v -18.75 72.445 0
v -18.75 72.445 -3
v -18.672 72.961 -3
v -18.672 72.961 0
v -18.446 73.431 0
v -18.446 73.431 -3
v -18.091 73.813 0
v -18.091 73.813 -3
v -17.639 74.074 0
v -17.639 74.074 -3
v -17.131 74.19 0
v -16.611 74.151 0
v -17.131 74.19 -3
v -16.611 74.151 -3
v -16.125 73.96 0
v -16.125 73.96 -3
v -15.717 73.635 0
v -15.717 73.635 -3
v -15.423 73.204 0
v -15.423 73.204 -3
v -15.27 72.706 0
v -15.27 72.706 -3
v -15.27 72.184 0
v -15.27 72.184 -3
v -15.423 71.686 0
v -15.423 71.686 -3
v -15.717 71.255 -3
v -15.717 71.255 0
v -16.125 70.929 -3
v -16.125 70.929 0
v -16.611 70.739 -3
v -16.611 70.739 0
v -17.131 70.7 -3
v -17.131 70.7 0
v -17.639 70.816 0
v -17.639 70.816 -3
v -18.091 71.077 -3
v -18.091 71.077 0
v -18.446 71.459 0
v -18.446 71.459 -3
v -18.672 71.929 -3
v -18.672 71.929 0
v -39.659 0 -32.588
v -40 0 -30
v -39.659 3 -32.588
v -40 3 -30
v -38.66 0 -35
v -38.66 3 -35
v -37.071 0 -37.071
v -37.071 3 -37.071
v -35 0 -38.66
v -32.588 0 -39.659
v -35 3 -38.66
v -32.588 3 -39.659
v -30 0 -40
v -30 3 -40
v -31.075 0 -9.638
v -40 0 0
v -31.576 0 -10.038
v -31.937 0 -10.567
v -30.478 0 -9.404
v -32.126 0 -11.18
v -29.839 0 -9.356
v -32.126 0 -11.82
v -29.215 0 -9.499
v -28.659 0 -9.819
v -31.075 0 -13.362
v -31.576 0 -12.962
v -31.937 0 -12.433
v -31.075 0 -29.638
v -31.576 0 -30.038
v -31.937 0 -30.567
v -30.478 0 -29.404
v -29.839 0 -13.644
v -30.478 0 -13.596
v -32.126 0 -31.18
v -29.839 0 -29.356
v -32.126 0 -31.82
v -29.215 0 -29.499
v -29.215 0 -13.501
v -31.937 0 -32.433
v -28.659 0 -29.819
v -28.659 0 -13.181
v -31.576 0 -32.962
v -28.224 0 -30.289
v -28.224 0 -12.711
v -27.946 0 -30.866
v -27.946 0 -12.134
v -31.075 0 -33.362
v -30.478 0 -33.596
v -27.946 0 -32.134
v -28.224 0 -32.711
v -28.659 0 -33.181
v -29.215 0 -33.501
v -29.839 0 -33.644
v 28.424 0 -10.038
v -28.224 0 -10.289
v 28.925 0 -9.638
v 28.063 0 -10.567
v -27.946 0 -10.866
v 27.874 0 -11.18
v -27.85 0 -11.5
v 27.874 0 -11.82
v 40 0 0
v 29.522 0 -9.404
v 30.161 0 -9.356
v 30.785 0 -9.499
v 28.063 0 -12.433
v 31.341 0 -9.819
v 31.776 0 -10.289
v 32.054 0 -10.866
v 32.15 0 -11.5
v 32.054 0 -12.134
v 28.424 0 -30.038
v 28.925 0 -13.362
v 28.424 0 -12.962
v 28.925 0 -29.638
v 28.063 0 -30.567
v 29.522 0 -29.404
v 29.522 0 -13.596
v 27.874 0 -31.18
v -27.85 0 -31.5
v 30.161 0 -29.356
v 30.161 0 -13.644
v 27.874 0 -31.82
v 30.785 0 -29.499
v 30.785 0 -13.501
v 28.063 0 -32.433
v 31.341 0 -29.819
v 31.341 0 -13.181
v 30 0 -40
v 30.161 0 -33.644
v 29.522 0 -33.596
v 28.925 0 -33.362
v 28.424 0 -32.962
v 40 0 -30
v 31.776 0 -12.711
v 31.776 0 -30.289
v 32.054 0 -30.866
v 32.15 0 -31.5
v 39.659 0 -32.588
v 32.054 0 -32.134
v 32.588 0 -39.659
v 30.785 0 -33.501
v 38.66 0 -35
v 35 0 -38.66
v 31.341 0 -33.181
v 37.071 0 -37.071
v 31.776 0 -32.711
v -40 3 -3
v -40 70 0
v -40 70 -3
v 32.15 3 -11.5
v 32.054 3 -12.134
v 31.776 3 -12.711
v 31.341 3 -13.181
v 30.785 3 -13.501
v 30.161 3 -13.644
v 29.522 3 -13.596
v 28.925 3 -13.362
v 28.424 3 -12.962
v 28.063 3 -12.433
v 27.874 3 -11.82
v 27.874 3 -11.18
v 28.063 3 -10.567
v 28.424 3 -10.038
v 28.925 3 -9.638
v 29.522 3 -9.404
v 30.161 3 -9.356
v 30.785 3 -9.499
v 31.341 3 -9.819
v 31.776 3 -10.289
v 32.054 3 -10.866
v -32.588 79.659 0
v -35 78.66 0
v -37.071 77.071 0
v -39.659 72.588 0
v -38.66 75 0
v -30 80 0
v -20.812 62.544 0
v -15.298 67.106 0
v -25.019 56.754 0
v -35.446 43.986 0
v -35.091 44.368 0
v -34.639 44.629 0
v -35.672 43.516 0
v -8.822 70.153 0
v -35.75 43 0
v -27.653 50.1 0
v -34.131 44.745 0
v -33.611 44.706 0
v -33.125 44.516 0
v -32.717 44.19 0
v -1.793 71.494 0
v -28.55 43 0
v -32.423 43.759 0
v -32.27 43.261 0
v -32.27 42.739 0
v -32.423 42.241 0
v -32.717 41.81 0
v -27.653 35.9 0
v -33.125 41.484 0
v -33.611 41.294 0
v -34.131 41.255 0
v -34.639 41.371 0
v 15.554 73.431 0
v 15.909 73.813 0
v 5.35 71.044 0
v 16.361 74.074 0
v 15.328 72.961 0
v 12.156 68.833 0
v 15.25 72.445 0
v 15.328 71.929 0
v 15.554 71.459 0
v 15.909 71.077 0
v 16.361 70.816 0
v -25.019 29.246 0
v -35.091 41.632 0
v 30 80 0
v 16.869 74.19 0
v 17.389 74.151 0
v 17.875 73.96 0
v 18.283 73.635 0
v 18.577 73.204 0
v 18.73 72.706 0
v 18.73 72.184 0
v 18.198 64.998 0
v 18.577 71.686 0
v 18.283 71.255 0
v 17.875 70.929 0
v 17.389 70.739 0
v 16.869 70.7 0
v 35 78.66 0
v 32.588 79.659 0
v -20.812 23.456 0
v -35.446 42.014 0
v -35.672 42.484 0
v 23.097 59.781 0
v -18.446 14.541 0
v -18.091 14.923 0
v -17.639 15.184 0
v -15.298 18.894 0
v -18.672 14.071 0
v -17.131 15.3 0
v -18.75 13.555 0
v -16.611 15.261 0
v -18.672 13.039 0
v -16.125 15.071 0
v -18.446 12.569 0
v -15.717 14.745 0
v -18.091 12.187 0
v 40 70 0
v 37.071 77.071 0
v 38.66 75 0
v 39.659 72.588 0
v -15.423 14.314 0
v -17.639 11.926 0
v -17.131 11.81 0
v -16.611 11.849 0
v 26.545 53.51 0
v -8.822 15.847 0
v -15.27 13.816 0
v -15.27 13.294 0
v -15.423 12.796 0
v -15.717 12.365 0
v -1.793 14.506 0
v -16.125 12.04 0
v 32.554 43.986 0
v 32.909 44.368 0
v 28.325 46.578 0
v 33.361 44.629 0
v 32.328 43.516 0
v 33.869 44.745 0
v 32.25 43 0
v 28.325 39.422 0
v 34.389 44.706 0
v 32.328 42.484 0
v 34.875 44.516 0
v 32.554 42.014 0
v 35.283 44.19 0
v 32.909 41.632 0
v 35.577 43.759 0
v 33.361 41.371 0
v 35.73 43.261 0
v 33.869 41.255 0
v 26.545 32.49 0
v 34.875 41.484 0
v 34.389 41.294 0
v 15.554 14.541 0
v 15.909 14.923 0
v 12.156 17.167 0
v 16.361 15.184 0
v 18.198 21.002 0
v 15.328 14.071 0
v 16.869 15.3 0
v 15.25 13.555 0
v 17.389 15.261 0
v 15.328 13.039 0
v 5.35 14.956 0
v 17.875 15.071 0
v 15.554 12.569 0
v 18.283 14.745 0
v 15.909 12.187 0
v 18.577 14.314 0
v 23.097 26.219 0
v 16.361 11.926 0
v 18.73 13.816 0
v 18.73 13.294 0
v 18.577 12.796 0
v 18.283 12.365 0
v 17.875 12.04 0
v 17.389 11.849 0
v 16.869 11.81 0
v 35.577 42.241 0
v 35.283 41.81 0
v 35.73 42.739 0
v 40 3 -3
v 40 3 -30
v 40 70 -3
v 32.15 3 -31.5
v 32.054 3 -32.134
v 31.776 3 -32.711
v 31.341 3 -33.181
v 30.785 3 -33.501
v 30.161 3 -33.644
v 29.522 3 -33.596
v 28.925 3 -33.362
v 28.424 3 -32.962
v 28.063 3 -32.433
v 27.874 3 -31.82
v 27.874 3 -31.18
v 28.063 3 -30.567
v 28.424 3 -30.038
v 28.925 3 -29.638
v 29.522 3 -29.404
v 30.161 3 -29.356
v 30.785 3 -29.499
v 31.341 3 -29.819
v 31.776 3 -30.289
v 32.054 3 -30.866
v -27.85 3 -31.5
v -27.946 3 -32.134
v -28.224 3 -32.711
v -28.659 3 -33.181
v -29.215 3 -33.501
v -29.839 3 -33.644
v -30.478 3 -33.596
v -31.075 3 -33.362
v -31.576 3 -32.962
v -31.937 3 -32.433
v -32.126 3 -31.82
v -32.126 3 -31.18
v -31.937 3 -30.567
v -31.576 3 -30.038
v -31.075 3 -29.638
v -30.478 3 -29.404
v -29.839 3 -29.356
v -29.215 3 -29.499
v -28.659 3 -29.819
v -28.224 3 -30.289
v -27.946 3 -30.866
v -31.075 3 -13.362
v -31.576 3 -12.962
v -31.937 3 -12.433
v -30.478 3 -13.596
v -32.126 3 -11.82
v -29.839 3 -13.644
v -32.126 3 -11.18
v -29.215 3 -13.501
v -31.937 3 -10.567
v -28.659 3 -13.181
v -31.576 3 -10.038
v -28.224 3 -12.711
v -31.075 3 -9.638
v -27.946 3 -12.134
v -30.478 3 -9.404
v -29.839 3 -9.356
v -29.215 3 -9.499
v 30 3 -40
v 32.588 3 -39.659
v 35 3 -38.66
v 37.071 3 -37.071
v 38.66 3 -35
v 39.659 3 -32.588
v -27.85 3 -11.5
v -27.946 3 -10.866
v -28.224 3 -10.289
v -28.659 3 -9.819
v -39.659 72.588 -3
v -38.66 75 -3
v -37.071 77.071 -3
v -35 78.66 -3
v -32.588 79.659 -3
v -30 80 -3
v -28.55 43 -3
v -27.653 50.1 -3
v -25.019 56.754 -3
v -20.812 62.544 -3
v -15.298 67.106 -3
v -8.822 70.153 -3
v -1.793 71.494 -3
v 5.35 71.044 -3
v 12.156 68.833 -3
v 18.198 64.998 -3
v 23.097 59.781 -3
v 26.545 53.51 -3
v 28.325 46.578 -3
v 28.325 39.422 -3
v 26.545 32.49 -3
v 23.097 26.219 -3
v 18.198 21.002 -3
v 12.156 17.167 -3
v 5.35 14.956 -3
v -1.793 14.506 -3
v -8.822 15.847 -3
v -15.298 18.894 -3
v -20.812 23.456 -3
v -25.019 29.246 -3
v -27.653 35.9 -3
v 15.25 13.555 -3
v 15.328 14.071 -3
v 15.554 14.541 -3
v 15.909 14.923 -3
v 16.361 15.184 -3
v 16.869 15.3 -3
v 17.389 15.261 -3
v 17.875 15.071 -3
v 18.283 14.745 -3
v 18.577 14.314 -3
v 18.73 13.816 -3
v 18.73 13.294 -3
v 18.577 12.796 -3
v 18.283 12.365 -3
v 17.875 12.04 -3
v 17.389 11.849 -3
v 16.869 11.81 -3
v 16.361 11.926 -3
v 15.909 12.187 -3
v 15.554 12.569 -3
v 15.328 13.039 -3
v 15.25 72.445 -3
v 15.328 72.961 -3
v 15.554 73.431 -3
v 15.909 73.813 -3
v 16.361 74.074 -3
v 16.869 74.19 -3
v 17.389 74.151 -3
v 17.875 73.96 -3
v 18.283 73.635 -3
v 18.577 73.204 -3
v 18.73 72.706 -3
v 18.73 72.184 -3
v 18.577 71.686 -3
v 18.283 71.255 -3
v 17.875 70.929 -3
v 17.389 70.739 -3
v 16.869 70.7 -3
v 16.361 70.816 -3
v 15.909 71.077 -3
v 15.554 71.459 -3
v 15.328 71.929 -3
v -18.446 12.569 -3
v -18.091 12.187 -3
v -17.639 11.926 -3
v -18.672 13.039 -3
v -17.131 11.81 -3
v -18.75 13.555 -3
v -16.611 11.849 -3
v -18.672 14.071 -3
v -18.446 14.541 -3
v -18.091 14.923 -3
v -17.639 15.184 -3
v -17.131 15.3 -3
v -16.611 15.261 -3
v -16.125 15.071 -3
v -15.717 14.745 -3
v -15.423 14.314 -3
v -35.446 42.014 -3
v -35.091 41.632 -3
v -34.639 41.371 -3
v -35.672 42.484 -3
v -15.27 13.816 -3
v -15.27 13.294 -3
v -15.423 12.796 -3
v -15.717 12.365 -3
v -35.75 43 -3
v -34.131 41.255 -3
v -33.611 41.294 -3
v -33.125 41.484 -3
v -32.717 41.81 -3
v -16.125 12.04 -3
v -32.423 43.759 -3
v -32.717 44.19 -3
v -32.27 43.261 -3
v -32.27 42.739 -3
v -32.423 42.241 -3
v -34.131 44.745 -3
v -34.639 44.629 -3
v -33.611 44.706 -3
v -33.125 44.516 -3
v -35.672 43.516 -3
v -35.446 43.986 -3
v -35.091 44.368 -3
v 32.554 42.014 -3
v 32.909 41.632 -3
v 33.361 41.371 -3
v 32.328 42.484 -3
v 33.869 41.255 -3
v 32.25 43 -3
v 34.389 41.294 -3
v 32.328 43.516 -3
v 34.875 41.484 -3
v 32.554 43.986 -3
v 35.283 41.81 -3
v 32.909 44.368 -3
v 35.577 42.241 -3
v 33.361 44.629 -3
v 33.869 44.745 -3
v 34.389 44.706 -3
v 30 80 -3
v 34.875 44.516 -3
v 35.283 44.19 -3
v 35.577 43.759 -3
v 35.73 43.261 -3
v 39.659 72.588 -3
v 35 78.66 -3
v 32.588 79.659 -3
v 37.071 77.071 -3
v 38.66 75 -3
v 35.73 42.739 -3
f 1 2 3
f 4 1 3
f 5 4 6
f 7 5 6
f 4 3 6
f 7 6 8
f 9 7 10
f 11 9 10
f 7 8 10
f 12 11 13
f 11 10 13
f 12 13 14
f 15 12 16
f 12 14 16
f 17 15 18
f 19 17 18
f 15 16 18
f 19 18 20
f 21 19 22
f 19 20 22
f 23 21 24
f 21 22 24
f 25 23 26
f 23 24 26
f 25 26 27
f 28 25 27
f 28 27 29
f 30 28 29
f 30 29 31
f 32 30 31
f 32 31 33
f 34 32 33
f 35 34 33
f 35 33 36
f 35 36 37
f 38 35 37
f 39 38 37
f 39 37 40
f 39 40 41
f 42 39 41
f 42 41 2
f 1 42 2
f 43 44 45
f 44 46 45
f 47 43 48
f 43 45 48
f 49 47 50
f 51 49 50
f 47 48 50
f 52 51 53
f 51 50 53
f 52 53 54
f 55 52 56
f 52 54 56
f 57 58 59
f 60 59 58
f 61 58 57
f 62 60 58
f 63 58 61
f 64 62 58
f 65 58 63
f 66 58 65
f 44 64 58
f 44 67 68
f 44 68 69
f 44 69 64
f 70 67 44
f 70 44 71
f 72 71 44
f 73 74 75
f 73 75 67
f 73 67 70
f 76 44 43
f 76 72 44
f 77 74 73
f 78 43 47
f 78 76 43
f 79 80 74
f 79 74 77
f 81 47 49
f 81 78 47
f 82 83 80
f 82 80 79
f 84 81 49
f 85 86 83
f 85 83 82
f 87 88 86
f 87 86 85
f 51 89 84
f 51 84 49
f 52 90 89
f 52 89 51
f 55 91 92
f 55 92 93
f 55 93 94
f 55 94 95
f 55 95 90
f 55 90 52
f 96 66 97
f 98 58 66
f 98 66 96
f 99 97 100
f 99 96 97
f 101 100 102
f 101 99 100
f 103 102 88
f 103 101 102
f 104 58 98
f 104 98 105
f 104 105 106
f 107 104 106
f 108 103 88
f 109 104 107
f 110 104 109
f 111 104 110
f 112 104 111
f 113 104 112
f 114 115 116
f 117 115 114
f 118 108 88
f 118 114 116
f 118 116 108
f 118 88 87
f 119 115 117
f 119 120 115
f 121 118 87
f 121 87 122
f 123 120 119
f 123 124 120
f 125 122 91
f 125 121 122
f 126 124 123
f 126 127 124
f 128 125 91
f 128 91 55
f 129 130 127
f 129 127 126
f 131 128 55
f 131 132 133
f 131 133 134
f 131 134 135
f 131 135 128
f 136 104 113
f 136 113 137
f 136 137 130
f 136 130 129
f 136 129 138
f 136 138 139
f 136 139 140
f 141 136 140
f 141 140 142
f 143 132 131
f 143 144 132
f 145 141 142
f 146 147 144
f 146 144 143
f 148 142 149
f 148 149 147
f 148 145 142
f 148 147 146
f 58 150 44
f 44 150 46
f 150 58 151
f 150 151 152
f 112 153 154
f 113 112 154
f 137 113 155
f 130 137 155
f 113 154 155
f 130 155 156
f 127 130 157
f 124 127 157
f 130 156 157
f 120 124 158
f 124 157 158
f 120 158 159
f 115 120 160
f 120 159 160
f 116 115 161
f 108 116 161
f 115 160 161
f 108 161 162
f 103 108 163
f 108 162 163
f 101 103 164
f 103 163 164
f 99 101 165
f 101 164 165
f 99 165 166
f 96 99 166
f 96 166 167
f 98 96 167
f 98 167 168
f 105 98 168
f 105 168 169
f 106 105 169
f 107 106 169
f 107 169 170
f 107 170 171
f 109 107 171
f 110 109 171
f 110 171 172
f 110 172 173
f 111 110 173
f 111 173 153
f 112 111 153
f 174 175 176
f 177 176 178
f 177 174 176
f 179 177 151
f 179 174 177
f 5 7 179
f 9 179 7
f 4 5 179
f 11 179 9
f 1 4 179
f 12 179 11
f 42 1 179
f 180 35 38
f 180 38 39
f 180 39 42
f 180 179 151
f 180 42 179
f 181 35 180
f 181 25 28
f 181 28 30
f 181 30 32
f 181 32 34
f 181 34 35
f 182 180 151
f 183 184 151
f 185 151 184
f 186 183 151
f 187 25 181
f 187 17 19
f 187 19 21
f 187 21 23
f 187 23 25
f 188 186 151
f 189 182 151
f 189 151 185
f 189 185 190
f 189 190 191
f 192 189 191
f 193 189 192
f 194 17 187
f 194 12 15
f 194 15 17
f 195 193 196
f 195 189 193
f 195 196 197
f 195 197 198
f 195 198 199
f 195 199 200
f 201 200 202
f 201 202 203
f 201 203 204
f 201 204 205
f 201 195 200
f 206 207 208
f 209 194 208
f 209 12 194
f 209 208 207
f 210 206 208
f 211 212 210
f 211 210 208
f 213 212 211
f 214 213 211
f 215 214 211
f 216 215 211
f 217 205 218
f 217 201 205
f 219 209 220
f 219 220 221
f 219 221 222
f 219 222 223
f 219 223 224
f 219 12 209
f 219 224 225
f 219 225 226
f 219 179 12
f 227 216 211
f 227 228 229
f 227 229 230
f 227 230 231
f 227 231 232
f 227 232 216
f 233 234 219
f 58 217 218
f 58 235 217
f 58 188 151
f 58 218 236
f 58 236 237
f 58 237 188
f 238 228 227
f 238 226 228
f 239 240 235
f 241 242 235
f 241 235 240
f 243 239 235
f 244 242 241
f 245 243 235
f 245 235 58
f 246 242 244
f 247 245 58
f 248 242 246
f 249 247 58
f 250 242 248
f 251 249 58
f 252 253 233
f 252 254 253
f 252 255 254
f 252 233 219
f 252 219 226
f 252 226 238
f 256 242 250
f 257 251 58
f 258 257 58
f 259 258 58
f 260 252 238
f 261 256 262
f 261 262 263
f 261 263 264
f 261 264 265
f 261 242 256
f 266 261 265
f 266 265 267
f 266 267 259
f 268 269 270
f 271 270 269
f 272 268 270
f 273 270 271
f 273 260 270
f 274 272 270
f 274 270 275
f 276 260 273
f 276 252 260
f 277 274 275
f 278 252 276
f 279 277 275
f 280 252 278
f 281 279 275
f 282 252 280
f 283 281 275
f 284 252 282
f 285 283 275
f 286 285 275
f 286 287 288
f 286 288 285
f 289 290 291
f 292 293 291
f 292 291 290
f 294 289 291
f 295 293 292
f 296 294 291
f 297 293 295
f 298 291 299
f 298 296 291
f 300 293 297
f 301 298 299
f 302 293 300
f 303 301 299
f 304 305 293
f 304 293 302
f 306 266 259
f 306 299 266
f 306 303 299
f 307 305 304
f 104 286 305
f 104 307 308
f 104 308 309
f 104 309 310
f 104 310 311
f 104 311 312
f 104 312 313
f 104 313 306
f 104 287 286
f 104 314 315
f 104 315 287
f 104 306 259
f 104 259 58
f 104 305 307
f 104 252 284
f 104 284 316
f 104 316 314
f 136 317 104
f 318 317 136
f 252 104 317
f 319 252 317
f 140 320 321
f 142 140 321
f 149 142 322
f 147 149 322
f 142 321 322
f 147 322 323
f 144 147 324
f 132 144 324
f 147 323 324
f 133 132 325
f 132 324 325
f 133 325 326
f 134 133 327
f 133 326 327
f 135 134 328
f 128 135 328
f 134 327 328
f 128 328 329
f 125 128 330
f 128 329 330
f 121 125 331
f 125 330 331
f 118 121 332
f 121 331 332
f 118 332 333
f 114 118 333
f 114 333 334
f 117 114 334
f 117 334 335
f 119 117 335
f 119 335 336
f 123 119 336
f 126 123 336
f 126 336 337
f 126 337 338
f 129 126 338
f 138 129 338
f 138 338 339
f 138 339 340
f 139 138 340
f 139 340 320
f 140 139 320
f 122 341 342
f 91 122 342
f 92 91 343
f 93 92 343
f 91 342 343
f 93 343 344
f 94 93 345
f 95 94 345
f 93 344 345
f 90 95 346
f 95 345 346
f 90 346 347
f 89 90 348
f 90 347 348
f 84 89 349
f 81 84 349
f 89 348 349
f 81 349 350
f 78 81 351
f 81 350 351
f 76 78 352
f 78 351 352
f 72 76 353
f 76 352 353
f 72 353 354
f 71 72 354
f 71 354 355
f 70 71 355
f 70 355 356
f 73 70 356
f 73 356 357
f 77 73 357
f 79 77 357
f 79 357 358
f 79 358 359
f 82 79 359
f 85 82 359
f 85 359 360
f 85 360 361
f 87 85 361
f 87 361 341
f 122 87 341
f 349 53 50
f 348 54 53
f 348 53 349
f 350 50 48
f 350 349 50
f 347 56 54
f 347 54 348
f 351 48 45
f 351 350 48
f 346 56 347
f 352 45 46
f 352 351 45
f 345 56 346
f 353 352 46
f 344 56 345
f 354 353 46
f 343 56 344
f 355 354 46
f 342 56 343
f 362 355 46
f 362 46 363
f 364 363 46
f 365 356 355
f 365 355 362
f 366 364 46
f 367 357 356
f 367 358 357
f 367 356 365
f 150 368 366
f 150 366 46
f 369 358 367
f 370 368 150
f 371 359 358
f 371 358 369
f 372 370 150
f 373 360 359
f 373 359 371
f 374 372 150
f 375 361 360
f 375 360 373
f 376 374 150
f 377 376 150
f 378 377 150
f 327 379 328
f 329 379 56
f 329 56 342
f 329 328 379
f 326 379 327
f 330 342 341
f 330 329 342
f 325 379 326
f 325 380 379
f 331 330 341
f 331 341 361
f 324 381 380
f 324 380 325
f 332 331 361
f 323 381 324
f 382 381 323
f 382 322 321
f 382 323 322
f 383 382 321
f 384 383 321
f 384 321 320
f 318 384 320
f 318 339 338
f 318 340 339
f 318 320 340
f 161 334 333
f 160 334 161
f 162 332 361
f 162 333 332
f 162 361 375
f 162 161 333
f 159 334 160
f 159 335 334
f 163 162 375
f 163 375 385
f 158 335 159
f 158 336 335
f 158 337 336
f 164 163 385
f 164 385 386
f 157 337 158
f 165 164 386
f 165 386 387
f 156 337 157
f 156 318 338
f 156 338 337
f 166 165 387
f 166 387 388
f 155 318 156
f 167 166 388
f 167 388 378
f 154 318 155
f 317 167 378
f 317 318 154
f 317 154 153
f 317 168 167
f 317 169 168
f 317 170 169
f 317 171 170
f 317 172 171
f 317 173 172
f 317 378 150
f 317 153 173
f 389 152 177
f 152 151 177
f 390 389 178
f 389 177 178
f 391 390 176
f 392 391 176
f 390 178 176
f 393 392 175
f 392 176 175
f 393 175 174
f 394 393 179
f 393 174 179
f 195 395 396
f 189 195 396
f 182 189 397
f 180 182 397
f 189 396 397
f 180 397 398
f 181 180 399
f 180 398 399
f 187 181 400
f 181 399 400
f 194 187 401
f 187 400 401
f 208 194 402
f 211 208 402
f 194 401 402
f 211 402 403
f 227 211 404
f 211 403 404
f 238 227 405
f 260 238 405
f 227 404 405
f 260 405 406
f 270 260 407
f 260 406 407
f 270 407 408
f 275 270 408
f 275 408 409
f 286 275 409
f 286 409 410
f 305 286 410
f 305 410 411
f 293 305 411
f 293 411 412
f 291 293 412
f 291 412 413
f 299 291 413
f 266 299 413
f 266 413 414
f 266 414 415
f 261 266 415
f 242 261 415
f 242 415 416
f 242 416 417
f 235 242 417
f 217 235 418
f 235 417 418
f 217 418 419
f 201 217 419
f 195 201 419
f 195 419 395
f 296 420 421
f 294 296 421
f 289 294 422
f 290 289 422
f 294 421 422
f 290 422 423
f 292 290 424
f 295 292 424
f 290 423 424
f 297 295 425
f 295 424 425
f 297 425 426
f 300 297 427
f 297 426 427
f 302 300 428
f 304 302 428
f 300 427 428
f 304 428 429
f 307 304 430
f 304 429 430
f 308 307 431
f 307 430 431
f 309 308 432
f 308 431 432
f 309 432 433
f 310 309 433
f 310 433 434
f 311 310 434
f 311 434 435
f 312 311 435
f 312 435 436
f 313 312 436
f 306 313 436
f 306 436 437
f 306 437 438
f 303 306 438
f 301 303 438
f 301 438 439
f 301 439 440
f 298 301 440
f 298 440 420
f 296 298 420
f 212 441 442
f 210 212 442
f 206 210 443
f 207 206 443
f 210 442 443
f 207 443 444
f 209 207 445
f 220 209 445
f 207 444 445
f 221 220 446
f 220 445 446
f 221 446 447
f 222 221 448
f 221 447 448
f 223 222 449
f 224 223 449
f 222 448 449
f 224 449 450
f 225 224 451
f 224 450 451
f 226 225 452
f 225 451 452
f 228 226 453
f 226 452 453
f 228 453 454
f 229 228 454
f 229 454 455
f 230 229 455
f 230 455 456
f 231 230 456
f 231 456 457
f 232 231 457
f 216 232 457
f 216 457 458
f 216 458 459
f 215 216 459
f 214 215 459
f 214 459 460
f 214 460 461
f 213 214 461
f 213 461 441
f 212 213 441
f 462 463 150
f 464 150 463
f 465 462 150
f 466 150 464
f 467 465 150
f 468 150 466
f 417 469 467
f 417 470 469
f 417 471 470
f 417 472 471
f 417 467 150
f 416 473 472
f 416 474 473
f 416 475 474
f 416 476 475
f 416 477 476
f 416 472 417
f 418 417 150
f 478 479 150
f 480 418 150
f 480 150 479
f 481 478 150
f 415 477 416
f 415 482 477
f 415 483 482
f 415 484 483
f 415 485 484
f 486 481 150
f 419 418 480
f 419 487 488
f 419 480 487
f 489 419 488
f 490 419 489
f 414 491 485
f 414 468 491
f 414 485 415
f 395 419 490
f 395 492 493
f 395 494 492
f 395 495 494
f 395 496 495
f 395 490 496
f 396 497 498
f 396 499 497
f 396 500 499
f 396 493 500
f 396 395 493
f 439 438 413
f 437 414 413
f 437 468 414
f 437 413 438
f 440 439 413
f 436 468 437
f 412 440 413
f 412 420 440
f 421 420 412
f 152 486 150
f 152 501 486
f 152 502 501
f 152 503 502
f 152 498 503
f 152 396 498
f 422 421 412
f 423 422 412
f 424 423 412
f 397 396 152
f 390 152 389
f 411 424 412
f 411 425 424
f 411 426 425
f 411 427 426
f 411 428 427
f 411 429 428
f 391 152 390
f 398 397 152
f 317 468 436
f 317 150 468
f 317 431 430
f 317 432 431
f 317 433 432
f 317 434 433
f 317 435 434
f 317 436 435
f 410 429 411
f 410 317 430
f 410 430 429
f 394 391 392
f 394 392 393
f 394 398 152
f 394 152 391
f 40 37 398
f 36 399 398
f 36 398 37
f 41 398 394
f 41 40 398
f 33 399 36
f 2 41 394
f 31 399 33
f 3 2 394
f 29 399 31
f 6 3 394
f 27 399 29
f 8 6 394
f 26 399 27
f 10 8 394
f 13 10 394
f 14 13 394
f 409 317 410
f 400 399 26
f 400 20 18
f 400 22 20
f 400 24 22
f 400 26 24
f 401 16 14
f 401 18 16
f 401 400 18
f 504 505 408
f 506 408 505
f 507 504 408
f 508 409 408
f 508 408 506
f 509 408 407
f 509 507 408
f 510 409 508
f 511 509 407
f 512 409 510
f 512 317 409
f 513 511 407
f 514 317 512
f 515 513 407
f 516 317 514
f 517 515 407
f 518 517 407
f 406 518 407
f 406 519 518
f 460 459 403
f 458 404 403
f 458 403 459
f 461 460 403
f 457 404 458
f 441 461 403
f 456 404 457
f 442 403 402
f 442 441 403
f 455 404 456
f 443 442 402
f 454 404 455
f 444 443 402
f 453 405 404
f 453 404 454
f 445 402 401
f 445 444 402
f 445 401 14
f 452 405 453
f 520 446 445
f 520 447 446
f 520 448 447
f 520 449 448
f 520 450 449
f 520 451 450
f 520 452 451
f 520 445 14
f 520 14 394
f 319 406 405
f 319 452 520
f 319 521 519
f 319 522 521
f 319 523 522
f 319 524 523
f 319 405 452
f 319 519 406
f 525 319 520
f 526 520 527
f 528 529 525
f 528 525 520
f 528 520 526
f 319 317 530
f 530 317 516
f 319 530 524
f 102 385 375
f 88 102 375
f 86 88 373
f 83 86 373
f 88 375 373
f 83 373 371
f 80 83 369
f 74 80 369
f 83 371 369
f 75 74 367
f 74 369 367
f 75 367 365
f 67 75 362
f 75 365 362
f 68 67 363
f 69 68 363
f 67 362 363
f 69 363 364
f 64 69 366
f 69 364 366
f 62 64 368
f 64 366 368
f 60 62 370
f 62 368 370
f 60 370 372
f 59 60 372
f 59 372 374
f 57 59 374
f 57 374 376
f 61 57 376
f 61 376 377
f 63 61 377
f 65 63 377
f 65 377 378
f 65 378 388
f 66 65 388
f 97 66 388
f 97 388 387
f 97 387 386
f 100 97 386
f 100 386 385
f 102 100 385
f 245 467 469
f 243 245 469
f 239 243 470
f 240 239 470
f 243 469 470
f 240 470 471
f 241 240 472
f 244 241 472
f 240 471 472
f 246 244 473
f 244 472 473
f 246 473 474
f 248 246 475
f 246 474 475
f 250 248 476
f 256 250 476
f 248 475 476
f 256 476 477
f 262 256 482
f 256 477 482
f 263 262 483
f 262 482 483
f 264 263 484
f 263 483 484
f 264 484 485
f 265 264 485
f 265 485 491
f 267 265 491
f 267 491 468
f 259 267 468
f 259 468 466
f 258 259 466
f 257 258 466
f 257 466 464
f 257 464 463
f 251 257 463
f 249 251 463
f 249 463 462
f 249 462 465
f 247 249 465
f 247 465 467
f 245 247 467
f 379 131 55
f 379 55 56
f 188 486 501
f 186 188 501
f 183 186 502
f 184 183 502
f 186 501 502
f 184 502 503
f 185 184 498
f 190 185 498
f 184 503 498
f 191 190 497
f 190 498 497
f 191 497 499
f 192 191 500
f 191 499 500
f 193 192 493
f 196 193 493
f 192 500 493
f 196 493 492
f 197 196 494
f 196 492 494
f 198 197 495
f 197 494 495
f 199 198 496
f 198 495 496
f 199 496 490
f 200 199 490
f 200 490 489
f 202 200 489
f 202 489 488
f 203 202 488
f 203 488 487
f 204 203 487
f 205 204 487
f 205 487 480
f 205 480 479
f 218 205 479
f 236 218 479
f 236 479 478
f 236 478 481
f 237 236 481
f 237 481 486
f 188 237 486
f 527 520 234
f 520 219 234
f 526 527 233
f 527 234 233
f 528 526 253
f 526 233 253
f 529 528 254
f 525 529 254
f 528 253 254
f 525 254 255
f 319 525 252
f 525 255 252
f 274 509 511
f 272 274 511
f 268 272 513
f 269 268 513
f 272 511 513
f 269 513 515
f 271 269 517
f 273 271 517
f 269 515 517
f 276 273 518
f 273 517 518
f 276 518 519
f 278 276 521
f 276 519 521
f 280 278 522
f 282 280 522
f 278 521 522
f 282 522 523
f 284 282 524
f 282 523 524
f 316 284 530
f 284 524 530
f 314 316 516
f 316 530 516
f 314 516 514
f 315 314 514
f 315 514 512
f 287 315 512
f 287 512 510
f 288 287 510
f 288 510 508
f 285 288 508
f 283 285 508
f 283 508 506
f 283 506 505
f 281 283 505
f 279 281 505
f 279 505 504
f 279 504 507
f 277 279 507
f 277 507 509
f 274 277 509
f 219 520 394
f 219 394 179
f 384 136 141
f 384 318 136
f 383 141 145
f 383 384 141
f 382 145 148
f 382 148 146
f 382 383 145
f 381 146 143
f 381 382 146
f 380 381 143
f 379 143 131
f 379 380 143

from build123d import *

# Parameters (mm, degrees)
EXTRUDE_1_DEPTH        = 40
SKETCH_3_R             = 1.75
SKETCH_3_R_2           = 28.55
MOTOR_FIXED_HOLE_DEPTH = 4
SKETCH_4_R             = 2.15
BASE_HOLE_DEPTH        = 4
FILLET_1_R             = 10


with BuildPart() as part:
    # 草圖2 → 填料-伸長1 (new body, symmetric)
    with BuildSketch(Plane(origin=(0, 0, 0), x_dir=(0, 0, -1), z_dir=(1, 0, 0))):
        Polygon((0, 80), (0, 0), (40, 0), (40, 3), (3, 3), (3, 80), align=None)
    extrude(amount=EXTRUDE_1_DEPTH, both=True)

    # 草圖3 → motor_fixed_hole (cut, through all)
    with BuildSketch(Plane(origin=(0, 0, -3), x_dir=(-1, 0, 0), z_dir=(0, 0, -1))):
        with Locations((17, 72.444863729)):
            Circle(SKETCH_3_R)
        with Locations((34, 43)):
            Circle(SKETCH_3_R)
        with Locations((17, 13.555136271)):
            Circle(SKETCH_3_R)
        with Locations((-17, 13.555136271)):
            Circle(SKETCH_3_R)
        with Locations((-34, 43)):
            Circle(SKETCH_3_R)
        with Locations((-17, 72.444863729)):
            Circle(SKETCH_3_R)
        with Locations((0, 43)):
            Circle(SKETCH_3_R_2)
    extrude(amount=-MOTOR_FIXED_HOLE_DEPTH, mode=Mode.SUBTRACT)

    # 草圖4 → base_hole (cut, through all)
    with BuildSketch(Plane(origin=(0, 3, 0), x_dir=(1, 0, 0), z_dir=(0, 1, 0))):
        with Locations((-30, 31.5)):
            Circle(SKETCH_4_R)
        with Locations((-30, 11.5)):
            Circle(SKETCH_4_R)
        with Locations((30, 11.5)):
            Circle(SKETCH_4_R)
        with Locations((30, 31.5)):
            Circle(SKETCH_4_R)
    extrude(amount=-BASE_HOLE_DEPTH, mode=Mode.SUBTRACT)

    # 圓角1
    fillet_1_edges = [part.edges().sort_by_distance(p)[0] for p in [
        (40, 1.5, -40),
        (40, 80, -1.5),
        (-40, 80, -1.5),
        (-40, 1.5, -40),
    ]]
    fillet(fillet_1_edges, radius=FILLET_1_R)


solid = part.part
